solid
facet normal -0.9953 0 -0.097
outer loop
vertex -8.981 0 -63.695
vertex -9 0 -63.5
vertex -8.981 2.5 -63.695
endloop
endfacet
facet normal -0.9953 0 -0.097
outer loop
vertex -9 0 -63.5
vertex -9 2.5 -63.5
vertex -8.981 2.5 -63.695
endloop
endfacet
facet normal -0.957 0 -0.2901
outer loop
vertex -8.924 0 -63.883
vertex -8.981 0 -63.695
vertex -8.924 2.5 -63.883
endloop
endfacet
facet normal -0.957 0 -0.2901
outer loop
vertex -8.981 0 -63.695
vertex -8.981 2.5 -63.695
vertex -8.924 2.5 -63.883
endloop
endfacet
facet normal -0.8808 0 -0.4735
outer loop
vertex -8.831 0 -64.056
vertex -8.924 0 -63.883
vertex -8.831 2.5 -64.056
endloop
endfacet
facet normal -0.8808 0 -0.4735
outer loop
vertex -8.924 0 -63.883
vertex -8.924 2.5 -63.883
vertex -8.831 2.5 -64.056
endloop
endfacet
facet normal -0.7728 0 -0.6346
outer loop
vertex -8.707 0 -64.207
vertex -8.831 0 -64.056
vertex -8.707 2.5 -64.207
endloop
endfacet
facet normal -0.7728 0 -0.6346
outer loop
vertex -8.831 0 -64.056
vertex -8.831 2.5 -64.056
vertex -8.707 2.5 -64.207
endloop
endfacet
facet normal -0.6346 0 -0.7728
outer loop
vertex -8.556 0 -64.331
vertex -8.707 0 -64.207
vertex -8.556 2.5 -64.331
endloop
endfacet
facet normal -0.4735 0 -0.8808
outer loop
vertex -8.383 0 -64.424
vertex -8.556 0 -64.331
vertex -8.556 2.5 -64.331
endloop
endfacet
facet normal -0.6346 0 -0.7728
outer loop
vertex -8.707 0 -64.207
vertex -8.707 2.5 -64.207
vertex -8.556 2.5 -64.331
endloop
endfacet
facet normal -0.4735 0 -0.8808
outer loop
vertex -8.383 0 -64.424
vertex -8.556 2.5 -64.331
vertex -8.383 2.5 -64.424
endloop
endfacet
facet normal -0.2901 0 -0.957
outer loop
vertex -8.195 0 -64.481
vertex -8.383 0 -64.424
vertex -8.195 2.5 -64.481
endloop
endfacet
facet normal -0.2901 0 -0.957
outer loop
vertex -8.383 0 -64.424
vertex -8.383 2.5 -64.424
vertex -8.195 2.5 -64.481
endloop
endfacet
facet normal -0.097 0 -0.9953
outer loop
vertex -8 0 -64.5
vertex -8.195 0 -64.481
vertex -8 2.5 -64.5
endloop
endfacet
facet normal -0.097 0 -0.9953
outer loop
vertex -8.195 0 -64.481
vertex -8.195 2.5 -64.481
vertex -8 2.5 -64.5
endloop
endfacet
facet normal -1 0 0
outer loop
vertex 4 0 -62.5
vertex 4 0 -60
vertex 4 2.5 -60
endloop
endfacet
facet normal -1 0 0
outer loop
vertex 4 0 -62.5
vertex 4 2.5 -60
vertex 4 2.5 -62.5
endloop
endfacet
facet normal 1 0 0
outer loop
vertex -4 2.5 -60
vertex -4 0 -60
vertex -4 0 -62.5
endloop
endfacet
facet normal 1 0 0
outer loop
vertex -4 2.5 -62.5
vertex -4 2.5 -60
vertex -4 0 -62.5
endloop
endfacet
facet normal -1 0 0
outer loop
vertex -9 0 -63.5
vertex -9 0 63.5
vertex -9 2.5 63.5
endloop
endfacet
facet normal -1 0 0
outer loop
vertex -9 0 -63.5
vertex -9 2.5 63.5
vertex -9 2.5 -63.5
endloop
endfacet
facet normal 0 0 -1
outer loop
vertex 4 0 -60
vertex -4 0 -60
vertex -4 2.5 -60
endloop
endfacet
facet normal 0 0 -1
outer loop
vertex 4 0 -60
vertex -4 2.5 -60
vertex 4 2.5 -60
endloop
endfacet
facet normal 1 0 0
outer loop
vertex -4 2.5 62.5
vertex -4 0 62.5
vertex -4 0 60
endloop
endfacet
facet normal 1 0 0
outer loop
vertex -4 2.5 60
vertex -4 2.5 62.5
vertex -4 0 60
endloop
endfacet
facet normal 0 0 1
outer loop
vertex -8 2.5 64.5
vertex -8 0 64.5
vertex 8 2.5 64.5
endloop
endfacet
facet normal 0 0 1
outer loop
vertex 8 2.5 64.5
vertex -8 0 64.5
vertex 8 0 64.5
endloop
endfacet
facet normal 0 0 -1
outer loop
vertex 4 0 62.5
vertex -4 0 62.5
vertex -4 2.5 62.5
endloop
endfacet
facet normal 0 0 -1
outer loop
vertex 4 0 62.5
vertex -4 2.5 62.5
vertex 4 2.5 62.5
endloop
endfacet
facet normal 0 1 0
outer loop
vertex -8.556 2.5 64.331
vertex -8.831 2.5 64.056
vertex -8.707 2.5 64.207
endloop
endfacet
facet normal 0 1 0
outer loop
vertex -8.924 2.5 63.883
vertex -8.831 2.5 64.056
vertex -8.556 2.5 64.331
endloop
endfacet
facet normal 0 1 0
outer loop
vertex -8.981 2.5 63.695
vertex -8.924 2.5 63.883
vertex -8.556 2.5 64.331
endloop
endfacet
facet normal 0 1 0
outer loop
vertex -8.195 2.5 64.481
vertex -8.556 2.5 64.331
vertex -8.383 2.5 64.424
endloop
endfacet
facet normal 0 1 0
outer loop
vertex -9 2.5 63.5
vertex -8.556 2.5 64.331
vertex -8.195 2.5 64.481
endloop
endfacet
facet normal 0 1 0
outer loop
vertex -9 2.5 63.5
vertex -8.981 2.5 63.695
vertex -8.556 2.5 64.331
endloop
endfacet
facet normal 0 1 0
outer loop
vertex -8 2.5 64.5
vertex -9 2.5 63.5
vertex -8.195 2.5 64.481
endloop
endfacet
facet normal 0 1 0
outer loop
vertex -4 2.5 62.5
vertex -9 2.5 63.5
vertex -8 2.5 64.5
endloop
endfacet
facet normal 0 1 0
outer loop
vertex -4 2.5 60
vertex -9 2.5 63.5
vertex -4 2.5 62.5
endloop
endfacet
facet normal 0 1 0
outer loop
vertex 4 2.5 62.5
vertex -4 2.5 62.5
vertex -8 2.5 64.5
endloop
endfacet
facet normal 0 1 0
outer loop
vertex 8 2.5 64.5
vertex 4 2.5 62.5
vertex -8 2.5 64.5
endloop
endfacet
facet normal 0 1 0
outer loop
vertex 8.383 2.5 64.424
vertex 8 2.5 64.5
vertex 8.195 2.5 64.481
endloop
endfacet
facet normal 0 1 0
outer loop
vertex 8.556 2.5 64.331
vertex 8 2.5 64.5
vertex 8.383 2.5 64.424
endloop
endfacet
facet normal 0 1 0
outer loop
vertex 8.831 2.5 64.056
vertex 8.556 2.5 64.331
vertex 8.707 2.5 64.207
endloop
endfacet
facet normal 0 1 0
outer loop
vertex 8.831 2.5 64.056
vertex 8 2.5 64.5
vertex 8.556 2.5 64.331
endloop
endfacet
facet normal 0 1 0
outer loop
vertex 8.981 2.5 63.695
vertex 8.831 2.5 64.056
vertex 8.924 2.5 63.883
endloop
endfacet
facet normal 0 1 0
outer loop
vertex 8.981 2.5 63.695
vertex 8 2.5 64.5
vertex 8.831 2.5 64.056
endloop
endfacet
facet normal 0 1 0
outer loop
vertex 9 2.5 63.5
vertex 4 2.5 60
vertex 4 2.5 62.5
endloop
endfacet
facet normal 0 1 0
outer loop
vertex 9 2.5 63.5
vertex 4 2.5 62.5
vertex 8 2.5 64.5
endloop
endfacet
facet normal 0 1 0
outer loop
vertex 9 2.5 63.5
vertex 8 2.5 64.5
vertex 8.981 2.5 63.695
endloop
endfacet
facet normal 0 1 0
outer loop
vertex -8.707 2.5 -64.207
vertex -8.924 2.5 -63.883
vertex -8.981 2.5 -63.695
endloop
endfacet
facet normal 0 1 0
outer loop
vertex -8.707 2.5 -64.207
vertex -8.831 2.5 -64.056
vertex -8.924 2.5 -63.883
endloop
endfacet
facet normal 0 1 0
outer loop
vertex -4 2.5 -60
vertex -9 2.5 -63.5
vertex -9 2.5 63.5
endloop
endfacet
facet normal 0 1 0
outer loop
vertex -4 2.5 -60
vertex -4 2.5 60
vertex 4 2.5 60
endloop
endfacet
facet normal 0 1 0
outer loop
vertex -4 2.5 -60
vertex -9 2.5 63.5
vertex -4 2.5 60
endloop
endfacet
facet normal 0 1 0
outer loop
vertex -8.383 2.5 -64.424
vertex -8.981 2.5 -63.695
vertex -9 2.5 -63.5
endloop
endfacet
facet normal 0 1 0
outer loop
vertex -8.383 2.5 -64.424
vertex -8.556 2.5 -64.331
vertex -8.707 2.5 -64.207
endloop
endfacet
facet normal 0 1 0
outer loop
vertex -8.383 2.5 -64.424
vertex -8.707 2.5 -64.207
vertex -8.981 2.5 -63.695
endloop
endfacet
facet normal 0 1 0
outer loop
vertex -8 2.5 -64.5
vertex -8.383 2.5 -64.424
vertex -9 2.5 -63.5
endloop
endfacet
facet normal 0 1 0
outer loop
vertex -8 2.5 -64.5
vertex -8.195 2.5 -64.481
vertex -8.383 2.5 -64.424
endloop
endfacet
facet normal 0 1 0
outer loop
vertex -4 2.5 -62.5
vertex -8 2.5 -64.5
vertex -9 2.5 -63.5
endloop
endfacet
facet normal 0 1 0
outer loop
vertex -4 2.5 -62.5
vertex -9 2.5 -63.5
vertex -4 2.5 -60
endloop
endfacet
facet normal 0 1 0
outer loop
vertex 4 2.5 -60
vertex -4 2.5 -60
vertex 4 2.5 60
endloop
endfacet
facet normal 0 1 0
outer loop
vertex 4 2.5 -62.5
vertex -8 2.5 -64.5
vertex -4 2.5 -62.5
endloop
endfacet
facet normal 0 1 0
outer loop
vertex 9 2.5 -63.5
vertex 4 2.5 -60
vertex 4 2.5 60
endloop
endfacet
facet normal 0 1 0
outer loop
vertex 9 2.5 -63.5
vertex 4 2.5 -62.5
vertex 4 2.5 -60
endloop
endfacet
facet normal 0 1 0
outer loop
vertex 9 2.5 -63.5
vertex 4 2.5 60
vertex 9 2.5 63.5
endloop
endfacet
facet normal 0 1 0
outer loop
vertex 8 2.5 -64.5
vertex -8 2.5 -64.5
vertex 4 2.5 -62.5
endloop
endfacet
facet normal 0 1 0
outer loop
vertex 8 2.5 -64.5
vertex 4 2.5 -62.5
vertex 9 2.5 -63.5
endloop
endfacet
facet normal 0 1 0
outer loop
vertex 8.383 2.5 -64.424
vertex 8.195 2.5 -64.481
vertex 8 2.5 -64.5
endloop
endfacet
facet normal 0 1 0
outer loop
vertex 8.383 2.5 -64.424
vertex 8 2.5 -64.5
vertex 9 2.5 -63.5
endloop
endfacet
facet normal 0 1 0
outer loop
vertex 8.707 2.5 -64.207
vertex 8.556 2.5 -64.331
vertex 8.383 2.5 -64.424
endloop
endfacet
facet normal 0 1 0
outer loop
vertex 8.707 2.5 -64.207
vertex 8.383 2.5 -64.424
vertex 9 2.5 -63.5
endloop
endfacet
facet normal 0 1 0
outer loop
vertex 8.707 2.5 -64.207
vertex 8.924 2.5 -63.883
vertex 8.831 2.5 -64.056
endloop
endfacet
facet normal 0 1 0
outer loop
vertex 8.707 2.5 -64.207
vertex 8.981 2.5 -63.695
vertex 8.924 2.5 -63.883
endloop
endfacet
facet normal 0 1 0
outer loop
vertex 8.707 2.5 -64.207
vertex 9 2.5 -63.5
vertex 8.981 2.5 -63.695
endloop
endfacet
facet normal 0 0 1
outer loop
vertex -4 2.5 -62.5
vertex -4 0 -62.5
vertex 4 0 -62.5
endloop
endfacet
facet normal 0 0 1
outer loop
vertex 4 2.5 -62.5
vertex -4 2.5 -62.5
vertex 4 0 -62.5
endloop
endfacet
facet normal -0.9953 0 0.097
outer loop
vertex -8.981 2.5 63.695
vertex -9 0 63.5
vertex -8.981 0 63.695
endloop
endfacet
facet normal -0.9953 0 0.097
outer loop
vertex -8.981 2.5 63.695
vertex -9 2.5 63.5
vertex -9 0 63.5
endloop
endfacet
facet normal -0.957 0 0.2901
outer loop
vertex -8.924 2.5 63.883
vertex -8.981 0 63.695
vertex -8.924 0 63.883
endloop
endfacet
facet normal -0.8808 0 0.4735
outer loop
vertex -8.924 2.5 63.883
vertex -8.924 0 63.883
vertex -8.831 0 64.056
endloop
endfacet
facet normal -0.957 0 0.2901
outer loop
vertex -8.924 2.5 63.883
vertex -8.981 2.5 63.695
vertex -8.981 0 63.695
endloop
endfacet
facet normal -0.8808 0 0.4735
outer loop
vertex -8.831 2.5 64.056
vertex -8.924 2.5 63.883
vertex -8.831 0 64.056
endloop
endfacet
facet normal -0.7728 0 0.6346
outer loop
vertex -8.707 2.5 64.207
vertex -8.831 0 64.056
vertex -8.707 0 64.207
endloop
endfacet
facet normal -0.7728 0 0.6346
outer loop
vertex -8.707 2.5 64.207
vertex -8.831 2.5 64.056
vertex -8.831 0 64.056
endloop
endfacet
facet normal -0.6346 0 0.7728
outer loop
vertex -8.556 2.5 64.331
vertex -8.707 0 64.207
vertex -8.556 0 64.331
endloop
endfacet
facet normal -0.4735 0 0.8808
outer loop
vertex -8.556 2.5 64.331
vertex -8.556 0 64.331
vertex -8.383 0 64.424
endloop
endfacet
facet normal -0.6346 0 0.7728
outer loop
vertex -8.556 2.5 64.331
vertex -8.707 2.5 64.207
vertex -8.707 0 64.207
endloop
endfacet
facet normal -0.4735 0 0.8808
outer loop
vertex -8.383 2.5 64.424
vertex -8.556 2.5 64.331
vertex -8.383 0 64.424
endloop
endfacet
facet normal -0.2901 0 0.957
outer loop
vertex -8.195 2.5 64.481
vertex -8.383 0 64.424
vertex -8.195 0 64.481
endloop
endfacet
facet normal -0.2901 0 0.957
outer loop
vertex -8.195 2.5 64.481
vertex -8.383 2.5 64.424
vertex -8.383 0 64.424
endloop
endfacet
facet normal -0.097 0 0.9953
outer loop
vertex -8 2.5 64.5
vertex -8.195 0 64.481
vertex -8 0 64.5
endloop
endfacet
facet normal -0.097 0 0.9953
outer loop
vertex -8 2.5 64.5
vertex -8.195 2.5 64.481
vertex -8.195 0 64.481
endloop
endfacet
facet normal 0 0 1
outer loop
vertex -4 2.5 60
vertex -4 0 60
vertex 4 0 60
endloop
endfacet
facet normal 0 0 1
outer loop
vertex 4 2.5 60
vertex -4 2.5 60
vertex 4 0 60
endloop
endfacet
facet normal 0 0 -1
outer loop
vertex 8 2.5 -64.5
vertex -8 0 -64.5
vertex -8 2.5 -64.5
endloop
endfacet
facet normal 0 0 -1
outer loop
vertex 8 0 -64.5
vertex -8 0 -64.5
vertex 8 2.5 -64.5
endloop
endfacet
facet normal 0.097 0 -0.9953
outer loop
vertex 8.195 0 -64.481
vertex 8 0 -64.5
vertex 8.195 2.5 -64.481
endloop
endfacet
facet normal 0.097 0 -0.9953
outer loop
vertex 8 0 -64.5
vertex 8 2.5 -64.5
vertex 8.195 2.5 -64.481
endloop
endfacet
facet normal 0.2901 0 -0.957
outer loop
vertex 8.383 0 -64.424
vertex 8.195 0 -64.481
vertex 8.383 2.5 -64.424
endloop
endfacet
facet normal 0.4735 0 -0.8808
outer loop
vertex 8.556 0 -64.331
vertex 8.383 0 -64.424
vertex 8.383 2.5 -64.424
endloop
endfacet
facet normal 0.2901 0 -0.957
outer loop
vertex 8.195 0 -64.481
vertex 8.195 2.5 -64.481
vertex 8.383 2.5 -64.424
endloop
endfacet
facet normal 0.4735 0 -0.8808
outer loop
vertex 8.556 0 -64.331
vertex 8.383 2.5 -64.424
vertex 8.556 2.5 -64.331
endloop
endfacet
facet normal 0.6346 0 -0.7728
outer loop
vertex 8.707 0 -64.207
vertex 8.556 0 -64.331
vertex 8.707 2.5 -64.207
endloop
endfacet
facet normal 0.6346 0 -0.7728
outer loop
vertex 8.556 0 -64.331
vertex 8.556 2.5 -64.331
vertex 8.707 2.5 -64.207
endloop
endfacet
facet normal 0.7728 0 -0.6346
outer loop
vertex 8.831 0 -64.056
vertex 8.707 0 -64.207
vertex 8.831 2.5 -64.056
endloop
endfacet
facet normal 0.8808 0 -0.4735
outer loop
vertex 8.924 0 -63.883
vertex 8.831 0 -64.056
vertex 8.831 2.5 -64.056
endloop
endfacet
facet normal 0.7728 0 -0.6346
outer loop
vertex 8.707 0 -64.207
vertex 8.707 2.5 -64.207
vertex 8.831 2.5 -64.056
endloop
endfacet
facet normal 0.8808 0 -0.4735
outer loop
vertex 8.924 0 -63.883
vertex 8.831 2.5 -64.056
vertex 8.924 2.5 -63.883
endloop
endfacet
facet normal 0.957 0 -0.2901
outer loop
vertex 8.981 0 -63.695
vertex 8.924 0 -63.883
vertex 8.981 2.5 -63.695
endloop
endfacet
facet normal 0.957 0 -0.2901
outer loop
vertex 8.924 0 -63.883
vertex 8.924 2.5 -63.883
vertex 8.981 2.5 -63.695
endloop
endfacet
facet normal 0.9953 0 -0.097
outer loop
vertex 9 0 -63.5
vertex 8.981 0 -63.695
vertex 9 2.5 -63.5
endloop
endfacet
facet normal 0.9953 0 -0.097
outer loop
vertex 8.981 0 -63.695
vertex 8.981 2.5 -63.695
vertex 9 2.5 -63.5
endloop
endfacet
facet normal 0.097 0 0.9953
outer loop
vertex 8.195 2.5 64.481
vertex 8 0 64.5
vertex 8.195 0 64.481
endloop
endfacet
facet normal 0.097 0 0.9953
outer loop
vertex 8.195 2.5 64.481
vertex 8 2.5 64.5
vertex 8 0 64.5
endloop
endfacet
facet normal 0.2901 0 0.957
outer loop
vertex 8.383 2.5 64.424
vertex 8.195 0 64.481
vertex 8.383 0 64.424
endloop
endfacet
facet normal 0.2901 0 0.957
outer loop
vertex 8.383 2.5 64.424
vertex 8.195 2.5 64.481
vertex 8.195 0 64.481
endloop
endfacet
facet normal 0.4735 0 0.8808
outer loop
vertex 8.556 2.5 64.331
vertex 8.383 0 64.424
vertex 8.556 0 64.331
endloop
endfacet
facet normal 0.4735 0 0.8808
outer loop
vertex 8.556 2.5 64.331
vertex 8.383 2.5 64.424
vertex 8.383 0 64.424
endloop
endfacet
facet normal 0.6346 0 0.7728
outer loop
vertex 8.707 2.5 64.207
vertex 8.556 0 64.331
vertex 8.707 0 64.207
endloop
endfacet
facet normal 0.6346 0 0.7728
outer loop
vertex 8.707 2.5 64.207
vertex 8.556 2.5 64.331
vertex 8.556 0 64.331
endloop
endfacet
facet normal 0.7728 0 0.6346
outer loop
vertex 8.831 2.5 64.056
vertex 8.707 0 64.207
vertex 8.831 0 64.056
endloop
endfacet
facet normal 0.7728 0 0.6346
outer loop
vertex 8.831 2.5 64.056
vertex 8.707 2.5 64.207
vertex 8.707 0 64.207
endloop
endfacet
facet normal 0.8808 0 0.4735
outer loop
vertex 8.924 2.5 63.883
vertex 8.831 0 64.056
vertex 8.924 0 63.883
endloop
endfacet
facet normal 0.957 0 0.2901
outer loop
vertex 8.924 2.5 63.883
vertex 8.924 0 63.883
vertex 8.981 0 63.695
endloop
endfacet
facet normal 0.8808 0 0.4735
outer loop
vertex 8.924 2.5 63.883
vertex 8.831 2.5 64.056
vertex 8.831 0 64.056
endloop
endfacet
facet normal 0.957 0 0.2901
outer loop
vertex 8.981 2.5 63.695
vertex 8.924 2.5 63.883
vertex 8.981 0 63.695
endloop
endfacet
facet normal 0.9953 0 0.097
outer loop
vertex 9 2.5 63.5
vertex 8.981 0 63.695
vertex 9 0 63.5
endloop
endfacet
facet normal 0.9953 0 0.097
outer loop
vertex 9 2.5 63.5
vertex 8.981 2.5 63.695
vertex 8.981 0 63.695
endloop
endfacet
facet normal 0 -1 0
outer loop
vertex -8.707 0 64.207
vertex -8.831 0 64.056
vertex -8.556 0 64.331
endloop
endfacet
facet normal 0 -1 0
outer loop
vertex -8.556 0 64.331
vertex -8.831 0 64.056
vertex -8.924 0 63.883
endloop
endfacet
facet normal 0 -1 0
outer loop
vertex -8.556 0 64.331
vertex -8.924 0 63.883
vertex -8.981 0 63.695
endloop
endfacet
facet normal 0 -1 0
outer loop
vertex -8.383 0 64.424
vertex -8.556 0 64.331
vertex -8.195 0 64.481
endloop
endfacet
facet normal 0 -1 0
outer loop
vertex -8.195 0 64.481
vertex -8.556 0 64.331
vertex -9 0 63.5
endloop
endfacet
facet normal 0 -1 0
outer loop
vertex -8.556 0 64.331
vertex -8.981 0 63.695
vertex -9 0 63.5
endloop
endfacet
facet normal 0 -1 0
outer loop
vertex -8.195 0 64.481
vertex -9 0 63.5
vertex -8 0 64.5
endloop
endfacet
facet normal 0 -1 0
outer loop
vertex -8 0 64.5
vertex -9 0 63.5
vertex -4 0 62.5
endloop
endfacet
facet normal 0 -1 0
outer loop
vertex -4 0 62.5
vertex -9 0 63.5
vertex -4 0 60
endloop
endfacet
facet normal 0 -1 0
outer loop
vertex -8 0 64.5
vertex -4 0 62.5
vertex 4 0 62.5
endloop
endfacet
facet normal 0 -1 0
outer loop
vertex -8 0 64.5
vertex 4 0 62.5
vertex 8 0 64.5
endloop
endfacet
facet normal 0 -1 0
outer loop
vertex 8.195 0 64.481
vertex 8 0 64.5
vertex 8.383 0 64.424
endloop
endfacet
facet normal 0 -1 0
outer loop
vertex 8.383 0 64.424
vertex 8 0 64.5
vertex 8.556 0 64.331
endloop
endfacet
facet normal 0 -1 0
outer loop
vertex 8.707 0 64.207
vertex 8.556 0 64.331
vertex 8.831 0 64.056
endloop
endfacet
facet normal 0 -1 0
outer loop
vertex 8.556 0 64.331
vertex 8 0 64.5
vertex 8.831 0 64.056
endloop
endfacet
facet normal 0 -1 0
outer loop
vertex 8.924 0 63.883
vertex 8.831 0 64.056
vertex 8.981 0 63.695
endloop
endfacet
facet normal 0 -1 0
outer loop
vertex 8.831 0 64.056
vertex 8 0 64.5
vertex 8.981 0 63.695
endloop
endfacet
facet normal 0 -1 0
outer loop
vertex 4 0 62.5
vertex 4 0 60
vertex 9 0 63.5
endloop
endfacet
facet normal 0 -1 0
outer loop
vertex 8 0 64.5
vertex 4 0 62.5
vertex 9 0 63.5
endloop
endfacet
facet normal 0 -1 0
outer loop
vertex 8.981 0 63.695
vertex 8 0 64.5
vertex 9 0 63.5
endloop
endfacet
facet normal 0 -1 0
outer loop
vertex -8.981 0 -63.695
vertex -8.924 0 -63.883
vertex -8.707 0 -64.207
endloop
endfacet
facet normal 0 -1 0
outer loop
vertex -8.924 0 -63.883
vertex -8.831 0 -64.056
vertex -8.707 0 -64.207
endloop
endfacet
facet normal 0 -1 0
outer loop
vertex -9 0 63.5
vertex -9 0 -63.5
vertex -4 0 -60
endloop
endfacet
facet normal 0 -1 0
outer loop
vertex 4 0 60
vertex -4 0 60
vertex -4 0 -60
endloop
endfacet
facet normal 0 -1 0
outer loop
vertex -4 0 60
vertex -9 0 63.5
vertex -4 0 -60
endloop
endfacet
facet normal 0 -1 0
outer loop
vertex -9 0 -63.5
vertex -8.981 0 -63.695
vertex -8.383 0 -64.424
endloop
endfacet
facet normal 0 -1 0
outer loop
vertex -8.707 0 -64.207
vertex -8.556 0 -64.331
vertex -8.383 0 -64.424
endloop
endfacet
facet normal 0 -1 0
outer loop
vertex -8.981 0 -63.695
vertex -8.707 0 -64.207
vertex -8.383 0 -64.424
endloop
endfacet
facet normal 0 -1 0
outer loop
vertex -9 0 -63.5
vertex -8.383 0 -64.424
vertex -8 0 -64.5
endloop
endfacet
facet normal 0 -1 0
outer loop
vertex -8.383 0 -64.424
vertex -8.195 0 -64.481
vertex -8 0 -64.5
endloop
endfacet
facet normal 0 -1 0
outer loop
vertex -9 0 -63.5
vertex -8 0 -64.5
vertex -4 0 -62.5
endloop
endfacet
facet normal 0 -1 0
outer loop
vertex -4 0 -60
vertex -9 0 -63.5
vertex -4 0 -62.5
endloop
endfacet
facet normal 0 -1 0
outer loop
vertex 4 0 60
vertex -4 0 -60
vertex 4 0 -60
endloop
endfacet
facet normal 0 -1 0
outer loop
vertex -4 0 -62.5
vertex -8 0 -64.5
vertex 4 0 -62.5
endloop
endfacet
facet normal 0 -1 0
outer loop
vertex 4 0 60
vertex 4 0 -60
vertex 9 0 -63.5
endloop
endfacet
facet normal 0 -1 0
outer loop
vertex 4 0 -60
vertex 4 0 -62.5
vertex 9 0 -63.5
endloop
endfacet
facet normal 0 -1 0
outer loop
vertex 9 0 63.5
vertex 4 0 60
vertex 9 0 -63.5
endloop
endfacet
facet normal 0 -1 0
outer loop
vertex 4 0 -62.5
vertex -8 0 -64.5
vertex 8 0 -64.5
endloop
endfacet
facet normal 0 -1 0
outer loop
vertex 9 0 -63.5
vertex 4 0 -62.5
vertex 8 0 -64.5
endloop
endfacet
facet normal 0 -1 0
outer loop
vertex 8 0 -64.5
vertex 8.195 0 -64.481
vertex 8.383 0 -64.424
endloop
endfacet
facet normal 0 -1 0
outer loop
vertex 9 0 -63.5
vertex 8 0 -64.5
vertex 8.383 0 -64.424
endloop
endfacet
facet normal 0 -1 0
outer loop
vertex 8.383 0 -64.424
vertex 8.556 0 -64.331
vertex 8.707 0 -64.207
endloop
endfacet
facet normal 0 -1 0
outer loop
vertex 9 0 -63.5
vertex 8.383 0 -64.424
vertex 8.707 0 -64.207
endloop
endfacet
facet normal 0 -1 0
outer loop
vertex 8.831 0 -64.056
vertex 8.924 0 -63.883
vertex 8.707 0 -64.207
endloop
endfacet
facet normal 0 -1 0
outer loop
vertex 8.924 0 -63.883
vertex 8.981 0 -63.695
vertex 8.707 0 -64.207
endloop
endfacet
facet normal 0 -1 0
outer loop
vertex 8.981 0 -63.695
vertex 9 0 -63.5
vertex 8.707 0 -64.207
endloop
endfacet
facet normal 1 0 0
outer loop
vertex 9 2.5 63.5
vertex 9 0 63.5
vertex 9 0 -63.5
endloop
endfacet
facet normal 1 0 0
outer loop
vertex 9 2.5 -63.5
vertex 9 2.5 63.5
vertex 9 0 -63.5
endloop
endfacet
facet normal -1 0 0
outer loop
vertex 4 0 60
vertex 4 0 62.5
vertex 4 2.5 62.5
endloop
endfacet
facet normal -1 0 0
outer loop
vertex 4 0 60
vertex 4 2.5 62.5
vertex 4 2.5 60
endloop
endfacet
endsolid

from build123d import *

# Parameters (mm, degrees)
SKETCH1_W           = 18
SKETCH1_H           = 129
SKETCH1_W_2         = 8
SKETCH1_H_2         = 2.5
BOSS_EXTRUDE1_DEPTH = 2.5
FILLET1_R           = 1


with BuildPart() as part:
    # Sketch1 → Boss-Extrude1 (new body)
    with BuildSketch(Plane(origin=(0, 0, 0), x_dir=(1, 0, 0), z_dir=(0, 1, 0))):
        Rectangle(SKETCH1_W, SKETCH1_H)
        with Locations((0, 61.25)):
            Rectangle(SKETCH1_W_2, SKETCH1_H_2, mode=Mode.SUBTRACT)
        with Locations((0, -61.25)):
            Rectangle(SKETCH1_W_2, SKETCH1_H_2, mode=Mode.SUBTRACT)
    extrude(amount=BOSS_EXTRUDE1_DEPTH)

    # Fillet1
    fillet1_edges = [part.edges().sort_by_distance(p)[0] for p in [
        (9, 1.25, 64.5),
        (-9, 1.25, 64.5),
        (-9, 1.25, -64.5),
        (9, 1.25, -64.5),
    ]]
    fillet(fillet1_edges, radius=FILLET1_R)


solid = part.part
